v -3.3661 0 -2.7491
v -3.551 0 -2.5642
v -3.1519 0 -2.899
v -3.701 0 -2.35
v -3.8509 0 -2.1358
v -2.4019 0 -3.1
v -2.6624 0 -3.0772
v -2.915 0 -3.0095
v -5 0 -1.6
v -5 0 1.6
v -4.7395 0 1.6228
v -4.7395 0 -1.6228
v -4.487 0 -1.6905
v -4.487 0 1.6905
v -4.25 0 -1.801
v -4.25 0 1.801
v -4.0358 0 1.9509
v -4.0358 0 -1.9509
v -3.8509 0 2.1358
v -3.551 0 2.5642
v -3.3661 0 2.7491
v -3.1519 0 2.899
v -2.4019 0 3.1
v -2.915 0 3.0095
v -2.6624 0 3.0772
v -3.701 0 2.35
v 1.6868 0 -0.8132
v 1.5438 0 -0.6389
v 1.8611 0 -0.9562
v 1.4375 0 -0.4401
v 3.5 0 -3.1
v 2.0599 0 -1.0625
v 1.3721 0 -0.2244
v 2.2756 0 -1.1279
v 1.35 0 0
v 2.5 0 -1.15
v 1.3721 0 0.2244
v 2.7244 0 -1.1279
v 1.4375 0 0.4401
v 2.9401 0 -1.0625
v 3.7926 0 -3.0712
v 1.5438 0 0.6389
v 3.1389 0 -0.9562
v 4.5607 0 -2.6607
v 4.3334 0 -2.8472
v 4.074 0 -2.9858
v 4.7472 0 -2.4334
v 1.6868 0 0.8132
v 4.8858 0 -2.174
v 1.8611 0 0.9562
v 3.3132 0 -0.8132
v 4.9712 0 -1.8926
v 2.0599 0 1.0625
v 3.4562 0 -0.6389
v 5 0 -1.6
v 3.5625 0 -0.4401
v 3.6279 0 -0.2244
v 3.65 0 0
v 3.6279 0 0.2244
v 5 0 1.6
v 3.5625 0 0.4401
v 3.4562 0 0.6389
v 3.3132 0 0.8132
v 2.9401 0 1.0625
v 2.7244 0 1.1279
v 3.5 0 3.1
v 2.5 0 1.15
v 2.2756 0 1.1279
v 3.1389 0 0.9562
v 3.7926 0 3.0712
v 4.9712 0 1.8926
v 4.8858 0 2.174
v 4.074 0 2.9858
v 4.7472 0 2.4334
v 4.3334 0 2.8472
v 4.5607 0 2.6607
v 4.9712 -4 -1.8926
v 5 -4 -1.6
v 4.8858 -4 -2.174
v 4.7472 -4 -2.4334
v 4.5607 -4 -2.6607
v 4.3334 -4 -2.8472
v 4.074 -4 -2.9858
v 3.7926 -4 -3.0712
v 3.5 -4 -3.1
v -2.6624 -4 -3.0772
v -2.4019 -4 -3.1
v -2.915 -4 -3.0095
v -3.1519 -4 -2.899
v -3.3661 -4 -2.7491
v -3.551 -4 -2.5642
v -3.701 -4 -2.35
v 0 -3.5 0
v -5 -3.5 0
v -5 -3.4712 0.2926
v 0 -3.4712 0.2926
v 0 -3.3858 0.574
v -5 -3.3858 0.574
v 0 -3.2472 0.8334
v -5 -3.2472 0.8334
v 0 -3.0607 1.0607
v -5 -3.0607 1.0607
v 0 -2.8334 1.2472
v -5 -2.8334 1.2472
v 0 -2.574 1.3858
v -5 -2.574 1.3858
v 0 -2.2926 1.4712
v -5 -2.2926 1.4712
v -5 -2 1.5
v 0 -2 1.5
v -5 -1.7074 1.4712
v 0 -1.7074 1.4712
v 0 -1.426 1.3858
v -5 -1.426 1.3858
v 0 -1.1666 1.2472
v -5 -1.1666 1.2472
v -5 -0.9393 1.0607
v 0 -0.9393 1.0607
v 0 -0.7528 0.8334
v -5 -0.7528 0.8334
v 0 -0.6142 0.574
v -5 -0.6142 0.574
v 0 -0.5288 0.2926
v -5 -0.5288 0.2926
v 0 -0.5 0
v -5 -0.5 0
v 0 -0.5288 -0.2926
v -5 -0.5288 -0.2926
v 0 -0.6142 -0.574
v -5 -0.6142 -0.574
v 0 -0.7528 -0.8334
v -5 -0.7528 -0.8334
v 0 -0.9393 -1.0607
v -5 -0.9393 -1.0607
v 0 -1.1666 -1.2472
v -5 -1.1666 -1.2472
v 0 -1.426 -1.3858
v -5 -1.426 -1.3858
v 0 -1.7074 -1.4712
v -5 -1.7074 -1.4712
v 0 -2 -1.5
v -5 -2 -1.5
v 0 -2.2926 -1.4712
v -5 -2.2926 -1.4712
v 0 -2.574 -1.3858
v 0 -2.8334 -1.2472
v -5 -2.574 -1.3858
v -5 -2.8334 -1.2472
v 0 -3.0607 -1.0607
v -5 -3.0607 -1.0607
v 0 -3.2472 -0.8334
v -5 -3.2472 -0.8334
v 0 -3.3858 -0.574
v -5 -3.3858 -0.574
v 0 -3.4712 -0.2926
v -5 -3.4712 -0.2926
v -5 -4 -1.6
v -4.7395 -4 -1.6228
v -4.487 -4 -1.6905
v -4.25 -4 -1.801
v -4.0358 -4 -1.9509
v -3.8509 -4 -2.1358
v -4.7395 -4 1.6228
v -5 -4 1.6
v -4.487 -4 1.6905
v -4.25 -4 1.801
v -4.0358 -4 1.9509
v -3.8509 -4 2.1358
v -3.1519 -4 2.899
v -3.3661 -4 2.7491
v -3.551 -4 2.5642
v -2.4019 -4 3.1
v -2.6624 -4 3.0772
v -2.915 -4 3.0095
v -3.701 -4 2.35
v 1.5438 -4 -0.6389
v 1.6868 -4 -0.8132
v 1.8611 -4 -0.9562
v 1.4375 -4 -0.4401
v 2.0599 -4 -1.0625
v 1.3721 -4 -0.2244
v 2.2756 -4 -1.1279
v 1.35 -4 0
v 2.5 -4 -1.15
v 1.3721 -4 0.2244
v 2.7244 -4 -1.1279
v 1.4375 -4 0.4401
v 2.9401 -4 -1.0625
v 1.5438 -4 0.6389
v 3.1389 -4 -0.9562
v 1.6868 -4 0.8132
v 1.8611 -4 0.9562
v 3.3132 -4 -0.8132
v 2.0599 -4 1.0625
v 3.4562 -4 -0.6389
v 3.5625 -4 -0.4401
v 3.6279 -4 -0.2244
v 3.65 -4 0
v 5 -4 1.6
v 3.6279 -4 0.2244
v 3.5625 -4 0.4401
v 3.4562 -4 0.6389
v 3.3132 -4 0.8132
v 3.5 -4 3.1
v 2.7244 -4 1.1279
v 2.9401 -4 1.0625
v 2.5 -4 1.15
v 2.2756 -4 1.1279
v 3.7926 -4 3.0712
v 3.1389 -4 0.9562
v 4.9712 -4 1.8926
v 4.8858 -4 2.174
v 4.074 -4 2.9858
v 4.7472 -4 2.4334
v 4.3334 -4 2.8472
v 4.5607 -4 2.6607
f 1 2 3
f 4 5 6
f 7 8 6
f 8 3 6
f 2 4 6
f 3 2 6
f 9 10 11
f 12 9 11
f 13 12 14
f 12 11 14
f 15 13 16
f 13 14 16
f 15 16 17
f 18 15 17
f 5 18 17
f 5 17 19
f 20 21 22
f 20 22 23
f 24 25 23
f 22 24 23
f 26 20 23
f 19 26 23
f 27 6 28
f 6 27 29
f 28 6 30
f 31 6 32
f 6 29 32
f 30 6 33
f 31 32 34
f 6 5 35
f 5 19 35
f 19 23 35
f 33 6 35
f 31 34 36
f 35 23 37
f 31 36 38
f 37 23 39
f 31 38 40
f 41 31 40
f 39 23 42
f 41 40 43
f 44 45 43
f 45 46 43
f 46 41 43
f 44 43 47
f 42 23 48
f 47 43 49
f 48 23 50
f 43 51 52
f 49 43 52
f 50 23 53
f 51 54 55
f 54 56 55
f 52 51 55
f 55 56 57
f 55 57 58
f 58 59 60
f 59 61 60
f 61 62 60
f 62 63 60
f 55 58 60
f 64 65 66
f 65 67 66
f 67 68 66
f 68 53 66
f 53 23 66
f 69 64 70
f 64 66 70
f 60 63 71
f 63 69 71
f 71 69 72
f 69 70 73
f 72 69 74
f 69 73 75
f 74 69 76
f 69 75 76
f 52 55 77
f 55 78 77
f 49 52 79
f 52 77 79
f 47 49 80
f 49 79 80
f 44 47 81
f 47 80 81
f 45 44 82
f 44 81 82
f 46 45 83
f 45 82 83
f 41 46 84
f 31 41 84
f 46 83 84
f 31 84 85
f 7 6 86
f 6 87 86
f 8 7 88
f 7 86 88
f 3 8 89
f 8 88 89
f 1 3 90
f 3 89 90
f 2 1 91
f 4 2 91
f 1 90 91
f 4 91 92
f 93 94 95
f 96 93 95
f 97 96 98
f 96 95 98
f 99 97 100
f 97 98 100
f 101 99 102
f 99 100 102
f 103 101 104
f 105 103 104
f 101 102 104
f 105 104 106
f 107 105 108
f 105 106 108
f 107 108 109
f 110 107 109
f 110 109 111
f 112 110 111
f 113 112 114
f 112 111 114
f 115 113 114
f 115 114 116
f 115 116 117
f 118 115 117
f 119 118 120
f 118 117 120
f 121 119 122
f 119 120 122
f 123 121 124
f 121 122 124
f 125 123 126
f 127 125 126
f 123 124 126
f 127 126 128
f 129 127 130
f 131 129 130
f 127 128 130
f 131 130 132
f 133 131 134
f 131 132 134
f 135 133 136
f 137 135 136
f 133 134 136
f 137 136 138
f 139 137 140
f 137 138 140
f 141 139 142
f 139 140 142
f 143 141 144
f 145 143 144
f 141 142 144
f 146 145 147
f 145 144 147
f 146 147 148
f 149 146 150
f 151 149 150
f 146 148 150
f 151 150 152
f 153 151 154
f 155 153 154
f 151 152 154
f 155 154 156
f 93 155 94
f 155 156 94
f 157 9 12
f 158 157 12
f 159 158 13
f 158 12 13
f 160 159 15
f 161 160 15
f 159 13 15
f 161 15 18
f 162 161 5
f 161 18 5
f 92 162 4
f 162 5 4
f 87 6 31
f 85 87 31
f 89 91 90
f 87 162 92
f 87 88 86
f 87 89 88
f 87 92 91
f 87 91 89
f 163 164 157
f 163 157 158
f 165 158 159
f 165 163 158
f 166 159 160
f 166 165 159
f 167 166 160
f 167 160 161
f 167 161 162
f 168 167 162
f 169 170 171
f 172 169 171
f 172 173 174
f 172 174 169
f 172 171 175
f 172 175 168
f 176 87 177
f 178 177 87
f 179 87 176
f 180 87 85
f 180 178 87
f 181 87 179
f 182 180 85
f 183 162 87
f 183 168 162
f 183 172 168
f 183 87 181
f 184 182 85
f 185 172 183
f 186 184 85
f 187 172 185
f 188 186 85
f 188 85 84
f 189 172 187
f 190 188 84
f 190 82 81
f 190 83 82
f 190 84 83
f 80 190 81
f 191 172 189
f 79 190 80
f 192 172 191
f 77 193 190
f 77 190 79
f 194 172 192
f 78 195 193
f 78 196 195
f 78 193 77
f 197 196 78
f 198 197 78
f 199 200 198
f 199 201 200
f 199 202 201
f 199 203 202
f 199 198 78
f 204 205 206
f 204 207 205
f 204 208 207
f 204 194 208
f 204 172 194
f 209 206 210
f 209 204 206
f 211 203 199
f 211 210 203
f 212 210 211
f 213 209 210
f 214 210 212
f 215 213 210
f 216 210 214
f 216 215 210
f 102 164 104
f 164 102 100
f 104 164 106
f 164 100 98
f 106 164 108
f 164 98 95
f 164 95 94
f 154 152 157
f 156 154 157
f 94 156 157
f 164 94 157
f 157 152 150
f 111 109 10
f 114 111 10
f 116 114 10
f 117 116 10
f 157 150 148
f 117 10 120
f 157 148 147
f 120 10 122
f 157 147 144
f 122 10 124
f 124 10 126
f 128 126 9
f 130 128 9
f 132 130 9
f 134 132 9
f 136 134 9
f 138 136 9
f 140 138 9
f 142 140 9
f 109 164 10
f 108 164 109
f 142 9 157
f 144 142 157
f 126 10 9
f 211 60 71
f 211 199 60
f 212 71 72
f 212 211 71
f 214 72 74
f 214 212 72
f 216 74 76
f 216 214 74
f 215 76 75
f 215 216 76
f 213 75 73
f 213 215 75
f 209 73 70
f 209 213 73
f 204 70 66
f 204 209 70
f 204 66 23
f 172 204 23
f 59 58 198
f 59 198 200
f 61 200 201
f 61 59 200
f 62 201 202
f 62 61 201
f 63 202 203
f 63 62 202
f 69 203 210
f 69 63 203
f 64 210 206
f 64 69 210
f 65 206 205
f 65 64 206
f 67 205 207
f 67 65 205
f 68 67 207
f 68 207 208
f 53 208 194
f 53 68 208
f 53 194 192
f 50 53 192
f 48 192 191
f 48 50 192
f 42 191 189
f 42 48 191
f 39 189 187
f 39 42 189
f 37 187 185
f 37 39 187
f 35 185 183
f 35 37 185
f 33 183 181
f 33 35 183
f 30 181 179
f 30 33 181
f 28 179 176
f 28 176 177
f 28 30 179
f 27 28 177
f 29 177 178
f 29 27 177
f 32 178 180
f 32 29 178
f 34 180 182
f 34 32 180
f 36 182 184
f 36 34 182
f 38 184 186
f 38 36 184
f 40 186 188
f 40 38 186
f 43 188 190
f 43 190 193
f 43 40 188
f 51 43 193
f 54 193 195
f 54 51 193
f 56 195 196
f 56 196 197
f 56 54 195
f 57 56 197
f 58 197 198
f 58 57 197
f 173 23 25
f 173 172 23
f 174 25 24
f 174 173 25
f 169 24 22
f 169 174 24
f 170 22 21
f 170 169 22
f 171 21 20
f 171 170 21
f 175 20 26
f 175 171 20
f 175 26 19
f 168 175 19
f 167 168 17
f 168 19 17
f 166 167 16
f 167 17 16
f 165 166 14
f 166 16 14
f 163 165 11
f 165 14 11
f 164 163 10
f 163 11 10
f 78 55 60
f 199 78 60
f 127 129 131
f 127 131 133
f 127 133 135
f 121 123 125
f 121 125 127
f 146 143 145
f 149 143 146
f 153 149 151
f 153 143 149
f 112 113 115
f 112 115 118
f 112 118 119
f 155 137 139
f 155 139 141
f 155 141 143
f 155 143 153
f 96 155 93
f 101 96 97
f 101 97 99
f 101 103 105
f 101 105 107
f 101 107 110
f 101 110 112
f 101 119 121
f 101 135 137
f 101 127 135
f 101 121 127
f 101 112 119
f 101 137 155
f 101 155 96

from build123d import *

# Parameters (mm, degrees)
F0_R     = 1.15
F1_DEPTH = 4
F2_R     = 1.5
F3_DEPTH = 5
F4_R     = 1.5


with BuildPart() as f1:
    # F0 (on Front) → F1 (new body)
    with BuildSketch(Plane.XZ):
        with BuildLine():
            Line((5, -3.1), (5, 3.1))
            Line((5, 3.1), (-3.5, 3.1))
            ThreePointArc((-3.5, 3.1), (-3.93934, 2.03934), (-5, 1.6))
            Line((-5, 1.6), (-5, -1.6))
            ThreePointArc((-5, -1.6), (-3.93934, -2.03934), (-3.5, -3.1))
            Line((-3.5, -3.1), (5, -3.1))
        make_face()
        with Locations((2.5, 0)):
            Circle(F0_R, mode=Mode.SUBTRACT)
    extrude(amount=F1_DEPTH)

    # F2 (on face) → F3 (cut)
    with BuildSketch(Plane(origin=(-5, 0, 0), x_dir=(0, -1, 0), z_dir=(-1, 0, 0))):
        with Locations((2, 0)):
            Circle(F2_R)
    extrude(amount=-F3_DEPTH, mode=Mode.SUBTRACT)

    # F4
    f4_edges = [f1.edges().sort_by_distance(p)[0] for p in [
        (-3.5, -2, 3.1),
        (-3.5, -2, -3.1),
        (5, -2, 3.1),
        (5, -2, -3.1),
    ]]
    fillet(f4_edges, radius=F4_R)


solid = f1.part
